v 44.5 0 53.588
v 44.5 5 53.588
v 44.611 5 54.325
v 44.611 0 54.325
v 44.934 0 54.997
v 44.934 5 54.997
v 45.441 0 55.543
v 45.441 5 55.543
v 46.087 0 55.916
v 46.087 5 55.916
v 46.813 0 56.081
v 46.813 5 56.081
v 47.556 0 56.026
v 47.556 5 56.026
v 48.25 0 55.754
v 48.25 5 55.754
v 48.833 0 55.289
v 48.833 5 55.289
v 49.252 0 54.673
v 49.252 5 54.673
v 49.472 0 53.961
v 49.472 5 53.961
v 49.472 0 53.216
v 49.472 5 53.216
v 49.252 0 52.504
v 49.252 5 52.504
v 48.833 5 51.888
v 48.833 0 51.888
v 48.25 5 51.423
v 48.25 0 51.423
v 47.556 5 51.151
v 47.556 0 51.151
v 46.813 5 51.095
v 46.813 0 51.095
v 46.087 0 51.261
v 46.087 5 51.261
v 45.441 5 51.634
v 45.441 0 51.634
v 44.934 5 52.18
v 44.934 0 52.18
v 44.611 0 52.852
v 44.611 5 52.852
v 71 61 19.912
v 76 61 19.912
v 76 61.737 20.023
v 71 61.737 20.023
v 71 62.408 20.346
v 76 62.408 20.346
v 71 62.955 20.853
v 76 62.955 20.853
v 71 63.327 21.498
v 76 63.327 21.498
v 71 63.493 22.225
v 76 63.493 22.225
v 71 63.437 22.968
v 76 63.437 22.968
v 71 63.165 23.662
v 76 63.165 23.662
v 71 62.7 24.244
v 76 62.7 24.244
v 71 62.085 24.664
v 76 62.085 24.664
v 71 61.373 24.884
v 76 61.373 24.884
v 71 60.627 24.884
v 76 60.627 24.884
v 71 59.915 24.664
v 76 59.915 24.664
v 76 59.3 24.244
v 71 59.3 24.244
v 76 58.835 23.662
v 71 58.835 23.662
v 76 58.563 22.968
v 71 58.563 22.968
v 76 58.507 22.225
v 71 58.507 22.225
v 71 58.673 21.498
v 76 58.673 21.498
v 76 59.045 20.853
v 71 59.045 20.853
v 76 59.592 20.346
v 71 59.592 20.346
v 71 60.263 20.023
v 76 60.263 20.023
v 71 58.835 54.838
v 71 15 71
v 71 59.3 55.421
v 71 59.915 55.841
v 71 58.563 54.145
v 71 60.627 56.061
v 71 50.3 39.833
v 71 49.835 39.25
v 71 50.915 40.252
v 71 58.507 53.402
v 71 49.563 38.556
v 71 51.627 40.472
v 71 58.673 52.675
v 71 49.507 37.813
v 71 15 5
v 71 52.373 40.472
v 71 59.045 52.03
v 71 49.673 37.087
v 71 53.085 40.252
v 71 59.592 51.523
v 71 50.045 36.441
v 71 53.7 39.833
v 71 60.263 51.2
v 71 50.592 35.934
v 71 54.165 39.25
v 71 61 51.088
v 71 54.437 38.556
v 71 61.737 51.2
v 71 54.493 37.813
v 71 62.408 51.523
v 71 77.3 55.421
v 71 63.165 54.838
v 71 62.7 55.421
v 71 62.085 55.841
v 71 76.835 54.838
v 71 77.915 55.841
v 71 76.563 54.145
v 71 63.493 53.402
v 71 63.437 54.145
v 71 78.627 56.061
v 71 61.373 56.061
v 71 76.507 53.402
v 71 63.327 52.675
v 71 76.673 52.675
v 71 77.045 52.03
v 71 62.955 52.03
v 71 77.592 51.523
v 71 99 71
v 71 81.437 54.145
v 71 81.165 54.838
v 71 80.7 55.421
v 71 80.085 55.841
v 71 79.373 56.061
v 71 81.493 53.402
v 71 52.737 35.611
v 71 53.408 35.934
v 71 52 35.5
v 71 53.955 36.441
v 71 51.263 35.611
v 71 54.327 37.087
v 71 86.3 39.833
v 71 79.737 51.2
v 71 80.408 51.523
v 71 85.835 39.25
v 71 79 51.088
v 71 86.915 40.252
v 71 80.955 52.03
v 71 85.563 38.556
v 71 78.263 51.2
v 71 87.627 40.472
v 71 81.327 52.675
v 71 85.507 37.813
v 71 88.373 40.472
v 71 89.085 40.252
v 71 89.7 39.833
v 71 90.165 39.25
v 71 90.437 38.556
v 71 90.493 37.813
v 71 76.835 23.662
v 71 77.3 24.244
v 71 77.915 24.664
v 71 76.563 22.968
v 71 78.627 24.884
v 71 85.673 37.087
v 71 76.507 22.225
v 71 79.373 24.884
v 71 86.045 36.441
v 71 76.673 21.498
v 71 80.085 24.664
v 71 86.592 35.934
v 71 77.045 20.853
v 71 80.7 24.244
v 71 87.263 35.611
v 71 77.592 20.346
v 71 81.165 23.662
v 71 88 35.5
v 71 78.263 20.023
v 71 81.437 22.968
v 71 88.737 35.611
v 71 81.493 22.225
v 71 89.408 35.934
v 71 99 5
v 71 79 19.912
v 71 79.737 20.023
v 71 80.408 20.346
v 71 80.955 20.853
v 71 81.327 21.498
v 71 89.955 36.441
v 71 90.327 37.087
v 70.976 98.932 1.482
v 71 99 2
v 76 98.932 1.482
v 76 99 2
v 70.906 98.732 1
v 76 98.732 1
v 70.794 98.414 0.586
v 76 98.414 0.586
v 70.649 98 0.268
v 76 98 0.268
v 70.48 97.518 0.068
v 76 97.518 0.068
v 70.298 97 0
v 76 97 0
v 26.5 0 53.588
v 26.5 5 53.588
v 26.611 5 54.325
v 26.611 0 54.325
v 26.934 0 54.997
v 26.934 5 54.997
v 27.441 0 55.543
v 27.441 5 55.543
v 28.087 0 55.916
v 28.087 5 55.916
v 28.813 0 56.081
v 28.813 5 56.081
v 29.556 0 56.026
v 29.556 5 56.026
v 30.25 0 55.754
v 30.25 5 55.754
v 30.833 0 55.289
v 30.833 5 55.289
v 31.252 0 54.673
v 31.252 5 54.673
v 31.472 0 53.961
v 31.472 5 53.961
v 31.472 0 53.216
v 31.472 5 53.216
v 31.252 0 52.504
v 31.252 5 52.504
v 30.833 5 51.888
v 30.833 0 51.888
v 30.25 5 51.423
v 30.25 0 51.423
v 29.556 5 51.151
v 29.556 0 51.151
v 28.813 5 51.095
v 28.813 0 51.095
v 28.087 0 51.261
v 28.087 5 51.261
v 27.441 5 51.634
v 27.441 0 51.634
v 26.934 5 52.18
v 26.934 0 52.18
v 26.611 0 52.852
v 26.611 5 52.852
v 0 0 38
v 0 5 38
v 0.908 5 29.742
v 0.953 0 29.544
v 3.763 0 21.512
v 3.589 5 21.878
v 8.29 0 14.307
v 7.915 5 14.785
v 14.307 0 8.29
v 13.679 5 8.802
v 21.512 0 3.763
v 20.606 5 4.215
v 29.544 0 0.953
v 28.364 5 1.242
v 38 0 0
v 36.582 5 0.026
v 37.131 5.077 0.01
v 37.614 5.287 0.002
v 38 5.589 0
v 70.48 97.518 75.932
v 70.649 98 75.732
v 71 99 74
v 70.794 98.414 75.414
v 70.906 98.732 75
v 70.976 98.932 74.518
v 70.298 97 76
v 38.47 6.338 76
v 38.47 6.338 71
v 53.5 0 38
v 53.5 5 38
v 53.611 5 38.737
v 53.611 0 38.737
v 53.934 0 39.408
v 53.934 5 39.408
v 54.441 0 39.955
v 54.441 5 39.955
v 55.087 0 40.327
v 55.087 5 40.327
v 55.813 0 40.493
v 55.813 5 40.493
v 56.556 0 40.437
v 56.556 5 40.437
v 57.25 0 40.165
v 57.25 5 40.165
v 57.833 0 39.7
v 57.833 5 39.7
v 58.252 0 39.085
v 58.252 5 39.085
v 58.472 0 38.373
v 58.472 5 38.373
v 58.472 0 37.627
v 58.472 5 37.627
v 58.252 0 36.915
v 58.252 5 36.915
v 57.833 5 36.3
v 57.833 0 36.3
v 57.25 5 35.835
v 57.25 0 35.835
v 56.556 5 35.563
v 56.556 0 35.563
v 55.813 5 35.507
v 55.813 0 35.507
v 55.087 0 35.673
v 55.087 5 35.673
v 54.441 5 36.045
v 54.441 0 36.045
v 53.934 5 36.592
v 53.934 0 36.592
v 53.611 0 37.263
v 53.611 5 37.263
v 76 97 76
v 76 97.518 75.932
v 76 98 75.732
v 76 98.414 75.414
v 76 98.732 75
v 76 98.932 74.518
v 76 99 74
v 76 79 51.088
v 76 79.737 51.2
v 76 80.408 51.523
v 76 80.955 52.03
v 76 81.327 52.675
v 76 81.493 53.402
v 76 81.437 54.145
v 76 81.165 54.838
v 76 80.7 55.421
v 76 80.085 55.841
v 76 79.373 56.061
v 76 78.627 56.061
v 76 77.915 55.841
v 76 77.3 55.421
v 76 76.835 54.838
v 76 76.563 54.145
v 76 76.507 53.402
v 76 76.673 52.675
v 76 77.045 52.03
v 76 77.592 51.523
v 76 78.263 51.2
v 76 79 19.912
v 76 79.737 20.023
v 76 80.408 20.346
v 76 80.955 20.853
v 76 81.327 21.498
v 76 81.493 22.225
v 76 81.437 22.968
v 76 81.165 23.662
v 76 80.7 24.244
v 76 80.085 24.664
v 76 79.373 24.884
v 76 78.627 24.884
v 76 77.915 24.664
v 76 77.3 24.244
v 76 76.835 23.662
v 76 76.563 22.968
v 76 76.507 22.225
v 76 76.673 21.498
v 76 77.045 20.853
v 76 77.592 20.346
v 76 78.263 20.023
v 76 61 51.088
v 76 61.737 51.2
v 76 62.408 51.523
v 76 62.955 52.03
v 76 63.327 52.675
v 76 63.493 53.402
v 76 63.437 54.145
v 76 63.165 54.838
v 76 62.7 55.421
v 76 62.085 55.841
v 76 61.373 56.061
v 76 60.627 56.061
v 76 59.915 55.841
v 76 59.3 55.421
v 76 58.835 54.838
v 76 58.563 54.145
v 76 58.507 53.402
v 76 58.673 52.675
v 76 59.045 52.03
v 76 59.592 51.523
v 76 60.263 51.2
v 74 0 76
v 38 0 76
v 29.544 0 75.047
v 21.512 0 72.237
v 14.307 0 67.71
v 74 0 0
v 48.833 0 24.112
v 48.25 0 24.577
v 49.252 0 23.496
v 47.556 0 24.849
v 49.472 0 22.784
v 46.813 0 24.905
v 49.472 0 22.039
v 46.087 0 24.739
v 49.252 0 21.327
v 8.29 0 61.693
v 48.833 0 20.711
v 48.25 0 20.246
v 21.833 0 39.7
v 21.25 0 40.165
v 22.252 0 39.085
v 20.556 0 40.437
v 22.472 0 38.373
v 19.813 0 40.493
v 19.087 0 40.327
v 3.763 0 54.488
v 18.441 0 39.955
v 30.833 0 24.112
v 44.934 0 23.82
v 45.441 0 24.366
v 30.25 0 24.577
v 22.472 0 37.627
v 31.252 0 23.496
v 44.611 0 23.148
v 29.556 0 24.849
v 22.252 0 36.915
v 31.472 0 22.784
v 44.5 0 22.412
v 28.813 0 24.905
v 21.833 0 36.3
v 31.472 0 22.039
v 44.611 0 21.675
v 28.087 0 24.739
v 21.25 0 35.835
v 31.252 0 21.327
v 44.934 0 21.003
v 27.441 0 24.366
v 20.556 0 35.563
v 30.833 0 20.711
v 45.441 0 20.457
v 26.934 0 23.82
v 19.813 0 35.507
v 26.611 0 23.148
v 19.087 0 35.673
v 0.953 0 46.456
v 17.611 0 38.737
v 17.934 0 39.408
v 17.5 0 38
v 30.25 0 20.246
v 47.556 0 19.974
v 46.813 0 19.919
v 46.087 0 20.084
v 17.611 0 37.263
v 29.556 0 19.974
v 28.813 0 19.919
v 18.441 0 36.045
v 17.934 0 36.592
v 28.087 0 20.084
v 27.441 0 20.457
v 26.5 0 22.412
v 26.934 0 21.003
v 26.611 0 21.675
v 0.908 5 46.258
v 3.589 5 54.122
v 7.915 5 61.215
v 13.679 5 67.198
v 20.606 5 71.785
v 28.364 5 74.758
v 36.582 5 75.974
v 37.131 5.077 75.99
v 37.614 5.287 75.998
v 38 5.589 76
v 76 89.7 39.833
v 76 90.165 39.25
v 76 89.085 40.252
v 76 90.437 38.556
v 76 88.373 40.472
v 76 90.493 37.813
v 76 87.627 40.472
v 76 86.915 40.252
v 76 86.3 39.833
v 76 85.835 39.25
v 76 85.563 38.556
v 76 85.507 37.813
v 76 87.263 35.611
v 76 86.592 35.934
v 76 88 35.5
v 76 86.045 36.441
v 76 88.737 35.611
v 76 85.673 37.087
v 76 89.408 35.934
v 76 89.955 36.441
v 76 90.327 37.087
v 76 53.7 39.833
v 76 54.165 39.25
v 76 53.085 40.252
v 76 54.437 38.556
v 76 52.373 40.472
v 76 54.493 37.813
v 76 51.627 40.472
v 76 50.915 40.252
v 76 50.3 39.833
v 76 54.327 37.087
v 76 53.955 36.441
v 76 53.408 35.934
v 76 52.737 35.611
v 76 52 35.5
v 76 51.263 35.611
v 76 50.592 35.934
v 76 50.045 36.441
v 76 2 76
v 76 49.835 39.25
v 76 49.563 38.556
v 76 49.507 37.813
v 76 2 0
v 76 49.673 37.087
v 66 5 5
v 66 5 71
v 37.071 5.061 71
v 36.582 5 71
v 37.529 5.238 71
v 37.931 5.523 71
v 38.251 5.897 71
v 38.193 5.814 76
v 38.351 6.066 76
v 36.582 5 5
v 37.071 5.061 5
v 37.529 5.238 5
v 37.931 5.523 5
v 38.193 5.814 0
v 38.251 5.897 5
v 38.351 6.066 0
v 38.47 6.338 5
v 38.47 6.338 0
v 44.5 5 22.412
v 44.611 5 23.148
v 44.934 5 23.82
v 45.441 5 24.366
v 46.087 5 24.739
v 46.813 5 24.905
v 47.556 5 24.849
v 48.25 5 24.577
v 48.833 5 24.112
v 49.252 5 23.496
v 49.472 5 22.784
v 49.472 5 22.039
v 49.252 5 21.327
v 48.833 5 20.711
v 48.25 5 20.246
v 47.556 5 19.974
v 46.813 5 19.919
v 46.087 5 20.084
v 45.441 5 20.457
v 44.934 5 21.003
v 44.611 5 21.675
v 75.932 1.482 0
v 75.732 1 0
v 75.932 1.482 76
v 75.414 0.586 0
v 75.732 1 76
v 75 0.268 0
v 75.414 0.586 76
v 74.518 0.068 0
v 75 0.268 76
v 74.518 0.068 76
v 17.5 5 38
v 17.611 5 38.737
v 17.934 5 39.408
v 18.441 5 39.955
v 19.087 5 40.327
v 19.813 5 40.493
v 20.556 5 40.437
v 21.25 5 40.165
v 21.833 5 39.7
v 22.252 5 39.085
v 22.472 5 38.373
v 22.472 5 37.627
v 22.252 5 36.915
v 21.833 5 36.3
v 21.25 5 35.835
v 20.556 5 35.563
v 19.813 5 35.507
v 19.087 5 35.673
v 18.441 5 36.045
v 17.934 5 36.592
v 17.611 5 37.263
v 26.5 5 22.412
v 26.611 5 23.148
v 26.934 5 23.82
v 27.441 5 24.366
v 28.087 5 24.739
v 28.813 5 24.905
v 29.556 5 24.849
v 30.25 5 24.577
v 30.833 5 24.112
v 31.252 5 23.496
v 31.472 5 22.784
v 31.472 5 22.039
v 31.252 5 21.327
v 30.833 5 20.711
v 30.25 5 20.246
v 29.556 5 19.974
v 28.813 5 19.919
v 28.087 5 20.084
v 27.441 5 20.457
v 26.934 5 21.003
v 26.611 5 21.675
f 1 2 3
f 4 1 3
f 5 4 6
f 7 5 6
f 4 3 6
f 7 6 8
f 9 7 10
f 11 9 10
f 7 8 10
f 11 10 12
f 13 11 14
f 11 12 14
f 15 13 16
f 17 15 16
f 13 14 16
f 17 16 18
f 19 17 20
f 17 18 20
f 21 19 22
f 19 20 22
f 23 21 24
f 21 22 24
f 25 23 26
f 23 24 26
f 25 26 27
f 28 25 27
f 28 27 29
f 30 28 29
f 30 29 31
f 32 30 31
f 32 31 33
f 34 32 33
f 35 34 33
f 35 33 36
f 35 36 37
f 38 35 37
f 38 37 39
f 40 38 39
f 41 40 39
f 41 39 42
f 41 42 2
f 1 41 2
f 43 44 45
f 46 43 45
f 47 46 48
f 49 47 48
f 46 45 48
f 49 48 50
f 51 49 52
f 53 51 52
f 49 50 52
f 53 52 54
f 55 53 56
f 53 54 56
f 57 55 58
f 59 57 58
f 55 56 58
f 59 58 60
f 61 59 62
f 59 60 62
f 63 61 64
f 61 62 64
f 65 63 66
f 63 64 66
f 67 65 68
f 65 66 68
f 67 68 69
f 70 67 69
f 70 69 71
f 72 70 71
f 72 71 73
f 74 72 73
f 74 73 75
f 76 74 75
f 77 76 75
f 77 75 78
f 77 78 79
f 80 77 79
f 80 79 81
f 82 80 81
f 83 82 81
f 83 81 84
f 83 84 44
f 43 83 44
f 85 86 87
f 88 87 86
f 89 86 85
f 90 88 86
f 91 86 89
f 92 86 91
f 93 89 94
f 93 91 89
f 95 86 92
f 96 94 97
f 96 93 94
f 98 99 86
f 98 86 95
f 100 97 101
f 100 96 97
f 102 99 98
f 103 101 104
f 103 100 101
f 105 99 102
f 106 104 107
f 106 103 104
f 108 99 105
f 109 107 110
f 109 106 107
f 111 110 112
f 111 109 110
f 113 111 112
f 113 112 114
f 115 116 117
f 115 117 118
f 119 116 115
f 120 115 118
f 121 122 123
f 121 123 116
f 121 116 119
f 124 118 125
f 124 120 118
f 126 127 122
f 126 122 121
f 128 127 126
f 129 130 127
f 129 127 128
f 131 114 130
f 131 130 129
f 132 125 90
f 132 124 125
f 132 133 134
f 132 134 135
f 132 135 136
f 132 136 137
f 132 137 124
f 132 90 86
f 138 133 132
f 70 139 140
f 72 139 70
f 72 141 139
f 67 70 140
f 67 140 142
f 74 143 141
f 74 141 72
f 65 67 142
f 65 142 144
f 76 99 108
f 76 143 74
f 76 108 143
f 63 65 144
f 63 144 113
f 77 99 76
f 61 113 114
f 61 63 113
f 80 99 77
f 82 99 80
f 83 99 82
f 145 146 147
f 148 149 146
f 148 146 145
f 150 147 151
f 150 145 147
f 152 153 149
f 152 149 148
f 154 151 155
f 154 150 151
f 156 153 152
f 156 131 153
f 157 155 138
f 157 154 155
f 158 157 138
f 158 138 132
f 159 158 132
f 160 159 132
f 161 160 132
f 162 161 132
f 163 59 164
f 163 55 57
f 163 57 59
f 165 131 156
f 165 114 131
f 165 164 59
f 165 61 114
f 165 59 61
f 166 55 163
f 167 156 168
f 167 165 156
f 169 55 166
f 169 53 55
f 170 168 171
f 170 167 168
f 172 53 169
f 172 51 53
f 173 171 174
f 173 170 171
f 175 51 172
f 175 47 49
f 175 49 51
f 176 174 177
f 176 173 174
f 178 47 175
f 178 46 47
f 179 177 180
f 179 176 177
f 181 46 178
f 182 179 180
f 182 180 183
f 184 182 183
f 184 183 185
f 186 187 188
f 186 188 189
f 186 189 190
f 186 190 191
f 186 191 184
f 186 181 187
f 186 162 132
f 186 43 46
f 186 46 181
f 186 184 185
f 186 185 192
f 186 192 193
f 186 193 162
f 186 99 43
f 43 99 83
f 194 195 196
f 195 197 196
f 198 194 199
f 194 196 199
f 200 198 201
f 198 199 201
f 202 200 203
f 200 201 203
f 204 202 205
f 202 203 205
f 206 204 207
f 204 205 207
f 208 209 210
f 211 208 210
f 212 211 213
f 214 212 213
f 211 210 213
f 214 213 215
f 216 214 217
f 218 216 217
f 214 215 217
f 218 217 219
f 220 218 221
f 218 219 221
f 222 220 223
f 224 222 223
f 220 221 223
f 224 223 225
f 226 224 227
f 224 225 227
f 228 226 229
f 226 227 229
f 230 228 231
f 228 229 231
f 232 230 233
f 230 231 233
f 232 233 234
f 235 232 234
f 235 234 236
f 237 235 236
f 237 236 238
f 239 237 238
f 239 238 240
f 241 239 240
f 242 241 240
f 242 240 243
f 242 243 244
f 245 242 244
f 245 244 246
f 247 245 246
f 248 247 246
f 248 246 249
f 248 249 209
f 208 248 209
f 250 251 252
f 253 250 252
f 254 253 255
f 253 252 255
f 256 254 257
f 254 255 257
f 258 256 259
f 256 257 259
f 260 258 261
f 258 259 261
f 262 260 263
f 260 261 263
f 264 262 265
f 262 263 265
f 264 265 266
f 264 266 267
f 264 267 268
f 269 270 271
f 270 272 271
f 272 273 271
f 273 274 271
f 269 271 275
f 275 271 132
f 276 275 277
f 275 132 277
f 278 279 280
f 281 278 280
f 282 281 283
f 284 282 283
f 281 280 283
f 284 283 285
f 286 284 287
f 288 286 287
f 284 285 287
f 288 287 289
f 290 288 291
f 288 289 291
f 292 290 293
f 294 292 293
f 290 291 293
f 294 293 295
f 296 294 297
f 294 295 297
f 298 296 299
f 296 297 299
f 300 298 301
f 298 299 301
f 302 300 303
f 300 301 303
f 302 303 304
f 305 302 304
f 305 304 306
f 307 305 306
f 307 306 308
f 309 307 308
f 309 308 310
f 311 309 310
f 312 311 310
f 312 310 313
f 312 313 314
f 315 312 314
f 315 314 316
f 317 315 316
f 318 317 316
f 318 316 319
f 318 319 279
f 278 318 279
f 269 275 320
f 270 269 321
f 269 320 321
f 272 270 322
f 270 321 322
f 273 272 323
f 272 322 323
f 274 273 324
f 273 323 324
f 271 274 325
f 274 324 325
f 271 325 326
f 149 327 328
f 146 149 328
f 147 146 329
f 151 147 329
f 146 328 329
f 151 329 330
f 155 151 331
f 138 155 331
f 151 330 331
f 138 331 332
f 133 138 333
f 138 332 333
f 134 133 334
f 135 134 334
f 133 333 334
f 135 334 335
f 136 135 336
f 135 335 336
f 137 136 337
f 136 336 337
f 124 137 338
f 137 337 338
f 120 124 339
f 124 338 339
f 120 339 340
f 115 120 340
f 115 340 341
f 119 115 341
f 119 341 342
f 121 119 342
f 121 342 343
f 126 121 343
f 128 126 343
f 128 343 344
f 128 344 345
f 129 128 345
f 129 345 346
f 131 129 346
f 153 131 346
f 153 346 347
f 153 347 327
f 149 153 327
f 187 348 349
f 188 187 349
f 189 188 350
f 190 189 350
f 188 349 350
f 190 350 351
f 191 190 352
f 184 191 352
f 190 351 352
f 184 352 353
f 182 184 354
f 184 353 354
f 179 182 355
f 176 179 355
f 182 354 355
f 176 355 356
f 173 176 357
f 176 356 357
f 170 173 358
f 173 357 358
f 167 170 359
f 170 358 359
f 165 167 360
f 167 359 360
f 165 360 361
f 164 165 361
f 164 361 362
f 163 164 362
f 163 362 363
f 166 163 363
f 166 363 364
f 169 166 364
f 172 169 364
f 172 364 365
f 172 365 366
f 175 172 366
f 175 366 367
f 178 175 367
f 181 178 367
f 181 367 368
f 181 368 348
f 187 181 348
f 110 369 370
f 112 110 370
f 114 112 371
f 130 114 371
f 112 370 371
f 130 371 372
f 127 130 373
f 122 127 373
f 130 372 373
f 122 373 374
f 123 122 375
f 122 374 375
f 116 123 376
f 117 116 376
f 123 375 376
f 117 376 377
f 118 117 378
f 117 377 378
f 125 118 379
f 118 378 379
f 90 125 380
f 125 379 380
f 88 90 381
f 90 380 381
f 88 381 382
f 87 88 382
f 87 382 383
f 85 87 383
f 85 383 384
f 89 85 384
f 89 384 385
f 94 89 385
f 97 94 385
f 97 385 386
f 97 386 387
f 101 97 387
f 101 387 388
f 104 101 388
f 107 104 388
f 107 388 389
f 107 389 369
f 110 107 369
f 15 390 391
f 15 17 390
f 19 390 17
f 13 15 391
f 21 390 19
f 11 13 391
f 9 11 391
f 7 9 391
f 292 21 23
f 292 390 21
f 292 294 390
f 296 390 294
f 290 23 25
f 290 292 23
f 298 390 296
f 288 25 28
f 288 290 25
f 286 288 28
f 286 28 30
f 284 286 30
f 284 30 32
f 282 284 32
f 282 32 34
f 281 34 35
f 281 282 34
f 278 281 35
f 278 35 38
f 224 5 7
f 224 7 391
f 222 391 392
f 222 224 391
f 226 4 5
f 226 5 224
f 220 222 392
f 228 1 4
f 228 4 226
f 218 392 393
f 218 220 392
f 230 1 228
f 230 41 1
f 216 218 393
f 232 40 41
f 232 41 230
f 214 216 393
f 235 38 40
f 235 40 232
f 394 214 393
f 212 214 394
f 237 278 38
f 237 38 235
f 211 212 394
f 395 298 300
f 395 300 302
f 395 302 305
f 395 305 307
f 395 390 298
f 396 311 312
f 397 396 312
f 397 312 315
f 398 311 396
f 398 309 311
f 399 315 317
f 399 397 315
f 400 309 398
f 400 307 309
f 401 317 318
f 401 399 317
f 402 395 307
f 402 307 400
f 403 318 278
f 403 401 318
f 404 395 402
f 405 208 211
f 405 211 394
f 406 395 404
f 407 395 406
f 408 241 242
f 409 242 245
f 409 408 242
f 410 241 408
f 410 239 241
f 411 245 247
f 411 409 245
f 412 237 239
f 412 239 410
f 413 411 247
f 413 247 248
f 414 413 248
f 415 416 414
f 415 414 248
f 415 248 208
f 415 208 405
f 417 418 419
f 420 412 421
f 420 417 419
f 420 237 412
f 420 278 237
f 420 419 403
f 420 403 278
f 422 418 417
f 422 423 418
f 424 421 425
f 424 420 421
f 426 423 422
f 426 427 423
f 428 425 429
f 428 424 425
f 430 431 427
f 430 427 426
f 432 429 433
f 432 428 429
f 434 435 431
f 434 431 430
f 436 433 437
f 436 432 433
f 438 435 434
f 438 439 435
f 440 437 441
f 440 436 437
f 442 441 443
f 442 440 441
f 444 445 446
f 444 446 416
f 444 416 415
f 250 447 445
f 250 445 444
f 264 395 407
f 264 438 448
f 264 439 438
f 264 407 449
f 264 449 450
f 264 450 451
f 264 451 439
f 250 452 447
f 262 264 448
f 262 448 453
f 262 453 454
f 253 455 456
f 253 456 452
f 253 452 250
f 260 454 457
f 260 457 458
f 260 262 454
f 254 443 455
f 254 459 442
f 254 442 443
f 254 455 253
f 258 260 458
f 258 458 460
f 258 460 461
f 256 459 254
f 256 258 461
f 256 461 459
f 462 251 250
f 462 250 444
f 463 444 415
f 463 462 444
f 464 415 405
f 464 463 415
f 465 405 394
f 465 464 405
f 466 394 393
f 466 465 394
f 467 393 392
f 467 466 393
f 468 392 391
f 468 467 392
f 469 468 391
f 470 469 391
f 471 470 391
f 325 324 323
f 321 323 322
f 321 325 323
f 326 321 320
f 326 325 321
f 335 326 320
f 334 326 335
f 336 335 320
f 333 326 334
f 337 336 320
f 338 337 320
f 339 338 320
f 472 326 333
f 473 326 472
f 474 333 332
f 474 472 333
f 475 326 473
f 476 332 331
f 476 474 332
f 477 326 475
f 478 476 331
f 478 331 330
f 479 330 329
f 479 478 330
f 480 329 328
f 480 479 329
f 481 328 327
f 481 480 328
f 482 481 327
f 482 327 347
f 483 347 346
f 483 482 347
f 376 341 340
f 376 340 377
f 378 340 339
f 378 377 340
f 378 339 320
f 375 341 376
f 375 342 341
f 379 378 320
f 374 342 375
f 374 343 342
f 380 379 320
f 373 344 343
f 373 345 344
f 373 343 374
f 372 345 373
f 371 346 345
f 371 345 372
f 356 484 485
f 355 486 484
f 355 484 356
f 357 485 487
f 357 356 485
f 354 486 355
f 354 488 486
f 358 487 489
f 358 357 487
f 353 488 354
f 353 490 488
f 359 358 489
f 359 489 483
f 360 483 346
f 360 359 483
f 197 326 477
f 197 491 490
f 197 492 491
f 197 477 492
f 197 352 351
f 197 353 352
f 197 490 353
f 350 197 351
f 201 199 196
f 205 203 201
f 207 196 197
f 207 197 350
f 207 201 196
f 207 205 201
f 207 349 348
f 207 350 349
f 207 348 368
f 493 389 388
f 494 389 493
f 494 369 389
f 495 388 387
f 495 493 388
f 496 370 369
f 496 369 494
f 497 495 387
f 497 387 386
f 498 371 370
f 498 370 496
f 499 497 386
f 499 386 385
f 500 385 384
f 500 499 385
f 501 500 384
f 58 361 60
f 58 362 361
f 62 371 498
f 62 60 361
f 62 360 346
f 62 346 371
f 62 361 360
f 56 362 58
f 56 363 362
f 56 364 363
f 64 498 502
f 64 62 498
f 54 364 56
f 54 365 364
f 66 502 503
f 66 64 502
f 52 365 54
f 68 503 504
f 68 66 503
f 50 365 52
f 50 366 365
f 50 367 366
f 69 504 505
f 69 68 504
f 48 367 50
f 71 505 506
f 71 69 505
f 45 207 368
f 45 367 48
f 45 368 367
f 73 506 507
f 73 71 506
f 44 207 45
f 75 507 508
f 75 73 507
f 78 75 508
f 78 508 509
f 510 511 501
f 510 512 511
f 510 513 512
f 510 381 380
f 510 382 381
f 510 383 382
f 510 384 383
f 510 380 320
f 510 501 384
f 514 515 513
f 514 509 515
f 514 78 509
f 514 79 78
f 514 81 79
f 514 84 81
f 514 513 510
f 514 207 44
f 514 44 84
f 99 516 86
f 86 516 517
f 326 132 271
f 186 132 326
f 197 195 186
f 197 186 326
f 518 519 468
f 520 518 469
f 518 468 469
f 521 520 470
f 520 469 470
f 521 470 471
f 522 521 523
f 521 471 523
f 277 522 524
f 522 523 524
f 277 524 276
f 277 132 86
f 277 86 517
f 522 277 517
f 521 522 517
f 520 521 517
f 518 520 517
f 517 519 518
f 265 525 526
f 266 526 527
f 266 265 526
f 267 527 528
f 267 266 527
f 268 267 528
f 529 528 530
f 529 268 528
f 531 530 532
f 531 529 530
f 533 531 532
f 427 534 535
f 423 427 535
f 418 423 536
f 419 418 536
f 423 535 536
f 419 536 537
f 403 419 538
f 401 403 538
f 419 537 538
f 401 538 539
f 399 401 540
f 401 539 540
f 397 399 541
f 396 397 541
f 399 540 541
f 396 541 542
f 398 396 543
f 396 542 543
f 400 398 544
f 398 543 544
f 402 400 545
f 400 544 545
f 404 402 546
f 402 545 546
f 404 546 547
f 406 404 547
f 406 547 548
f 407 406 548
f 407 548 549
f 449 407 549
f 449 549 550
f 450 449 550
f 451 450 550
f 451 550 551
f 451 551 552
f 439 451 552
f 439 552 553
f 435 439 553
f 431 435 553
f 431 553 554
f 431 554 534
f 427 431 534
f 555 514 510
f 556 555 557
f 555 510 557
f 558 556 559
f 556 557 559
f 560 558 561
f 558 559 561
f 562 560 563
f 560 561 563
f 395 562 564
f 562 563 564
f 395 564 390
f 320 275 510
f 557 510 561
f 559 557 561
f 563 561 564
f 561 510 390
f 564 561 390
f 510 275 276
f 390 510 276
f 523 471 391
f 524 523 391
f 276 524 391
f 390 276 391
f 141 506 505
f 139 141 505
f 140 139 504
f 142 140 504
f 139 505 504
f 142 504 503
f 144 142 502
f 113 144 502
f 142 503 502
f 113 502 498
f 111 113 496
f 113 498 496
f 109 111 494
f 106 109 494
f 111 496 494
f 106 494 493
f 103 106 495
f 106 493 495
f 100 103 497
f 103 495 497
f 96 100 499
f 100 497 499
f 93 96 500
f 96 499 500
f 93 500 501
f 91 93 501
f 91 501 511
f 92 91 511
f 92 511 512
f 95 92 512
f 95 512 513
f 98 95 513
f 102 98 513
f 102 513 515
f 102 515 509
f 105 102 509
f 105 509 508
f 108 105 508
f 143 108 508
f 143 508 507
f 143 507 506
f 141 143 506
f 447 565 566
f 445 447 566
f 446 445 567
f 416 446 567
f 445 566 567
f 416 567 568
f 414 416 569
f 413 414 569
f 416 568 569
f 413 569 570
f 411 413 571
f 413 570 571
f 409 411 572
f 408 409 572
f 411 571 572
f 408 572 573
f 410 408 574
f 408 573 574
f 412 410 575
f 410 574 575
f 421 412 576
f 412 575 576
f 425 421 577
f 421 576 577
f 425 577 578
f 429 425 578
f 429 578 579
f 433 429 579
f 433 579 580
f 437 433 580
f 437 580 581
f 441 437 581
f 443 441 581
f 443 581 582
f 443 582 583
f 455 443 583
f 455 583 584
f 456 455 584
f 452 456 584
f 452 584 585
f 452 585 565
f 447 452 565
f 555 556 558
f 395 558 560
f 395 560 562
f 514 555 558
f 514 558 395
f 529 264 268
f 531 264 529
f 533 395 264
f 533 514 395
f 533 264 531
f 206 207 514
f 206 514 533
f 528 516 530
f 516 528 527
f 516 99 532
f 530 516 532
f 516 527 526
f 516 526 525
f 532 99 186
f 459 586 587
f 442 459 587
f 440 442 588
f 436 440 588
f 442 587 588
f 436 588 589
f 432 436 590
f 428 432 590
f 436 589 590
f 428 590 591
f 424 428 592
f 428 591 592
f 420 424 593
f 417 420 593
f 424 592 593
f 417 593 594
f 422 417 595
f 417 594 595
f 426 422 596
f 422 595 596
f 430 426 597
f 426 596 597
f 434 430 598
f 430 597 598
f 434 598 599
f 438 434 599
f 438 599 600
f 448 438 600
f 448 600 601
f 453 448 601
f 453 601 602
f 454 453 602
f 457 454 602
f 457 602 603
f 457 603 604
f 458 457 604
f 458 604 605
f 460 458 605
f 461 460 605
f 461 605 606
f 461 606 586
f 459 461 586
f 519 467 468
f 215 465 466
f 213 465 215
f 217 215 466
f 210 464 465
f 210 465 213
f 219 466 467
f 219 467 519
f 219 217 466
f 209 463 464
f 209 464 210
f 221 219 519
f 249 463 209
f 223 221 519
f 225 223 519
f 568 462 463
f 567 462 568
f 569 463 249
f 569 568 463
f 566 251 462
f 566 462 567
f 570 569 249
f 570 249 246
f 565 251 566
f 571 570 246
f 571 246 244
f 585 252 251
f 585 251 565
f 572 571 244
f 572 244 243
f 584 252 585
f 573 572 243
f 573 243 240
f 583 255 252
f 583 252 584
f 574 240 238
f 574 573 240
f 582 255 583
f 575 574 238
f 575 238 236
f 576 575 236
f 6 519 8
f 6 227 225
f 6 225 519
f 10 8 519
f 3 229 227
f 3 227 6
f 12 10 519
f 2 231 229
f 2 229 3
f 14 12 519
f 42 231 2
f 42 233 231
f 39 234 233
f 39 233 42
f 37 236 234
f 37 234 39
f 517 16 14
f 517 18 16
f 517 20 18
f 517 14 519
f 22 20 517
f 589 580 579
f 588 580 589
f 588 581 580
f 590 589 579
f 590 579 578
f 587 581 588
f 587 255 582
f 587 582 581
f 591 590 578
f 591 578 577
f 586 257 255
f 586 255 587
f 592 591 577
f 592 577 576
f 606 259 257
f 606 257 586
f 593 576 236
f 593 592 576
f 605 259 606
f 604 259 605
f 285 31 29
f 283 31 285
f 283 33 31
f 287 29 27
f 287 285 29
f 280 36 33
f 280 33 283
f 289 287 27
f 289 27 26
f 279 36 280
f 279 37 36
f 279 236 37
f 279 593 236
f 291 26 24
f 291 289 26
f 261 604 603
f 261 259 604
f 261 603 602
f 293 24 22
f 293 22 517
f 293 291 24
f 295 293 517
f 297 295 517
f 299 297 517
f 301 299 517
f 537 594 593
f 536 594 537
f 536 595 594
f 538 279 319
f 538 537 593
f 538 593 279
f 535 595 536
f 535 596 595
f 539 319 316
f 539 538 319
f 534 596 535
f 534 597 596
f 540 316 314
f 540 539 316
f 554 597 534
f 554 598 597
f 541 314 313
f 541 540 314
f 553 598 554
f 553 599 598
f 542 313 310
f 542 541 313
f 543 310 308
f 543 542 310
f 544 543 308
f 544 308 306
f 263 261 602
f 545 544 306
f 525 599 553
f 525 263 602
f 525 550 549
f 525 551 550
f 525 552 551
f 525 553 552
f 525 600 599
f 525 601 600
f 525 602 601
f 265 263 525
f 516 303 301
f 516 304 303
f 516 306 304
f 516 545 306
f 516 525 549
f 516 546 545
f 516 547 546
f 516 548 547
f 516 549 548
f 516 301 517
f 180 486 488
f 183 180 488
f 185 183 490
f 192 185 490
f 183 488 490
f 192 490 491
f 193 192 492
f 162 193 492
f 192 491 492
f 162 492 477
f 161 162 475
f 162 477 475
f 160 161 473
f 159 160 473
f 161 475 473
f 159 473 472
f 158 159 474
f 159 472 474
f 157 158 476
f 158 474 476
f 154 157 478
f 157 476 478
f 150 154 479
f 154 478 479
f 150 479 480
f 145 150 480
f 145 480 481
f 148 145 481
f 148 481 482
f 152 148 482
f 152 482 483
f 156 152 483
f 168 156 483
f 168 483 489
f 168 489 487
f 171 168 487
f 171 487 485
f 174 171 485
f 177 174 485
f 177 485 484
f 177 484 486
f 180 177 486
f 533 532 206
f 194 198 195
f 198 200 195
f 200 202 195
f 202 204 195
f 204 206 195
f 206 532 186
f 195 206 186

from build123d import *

# Parameters (mm, degrees)
EXTRUDE_1_DEPTH     = 76
FILLET_1_R          = 38
RIB_1_REACH         = 148.127
SKETCH_4_WALL_W     = 393.877609006
SKETCH_4_WALL_H     = 5
RIB_START           = -5
RIB_2_DEPTH         = 5
SKETCH_7_R          = 2.5
CUT_EXTRUDE_1_DEPTH = 10
SKETCH_8_R          = 2.5
CUT_EXTRUDE_2_DEPTH = 10
FILLET_2_R          = 2
CHAMFER_1_SIZE      = 10
CHAMFER_1_SIZE2     = 5
FILLET_3_R          = 2
FILLET_4_R          = 2


# Read off the part's stored shape, not the designer's step: Ребро2
with BuildPart() as part:
    # Эскиз3 → Бобышка-Вытянуть1 (new body)
    with BuildSketch(Plane.XY):
        Polygon((76, 0), (0, 0), (0, 5), (71, 5), (71, 99), (76, 99), align=None)
    extrude(amount=EXTRUDE_1_DEPTH)

    # Скругление1
    fillet_1_edges = [part.edges().sort_by_distance(p)[0] for p in [
        (0, 2.5, 0),
        (0, 2.5, 76),
    ]]
    fillet(fillet_1_edges, radius=FILLET_1_R - 0.0001)  # a hair under: the kernel refuses the full size

    # Эскиз4 wall → Ребро1 (add, up to next)
    with BuildSketch(Plane(origin=(54.5, 52, 76), x_dir=(-0.331244504731, -0.94354495287, 0), z_dir=(0.94354495287, -0.331244504731, 0)), mode=Mode.PRIVATE) as rib_1_sk1:
        with Locations((0, 2.5)):
            Rectangle(SKETCH_4_WALL_W, SKETCH_4_WALL_H)
    rib_1_tool1 = extrude(rib_1_sk1.sketch, amount=RIB_1_REACH, mode=Mode.PRIVATE) - part.part
    add(rib_1_tool1.solids().sort_by_distance((54.5, 52, 76))[0])

    # Ребро2 outline → Ребро2 (add)
    with BuildSketch(Plane(origin=(0, 0, 0), x_dir=(-1, 0, 0), z_dir=(0, 0, -1)).offset(RIB_START)):
        Polygon((-38, 5), (-71, 99), (-71, 5), align=None)
    extrude(amount=RIB_2_DEPTH)

    # Эскиз7 → Вырез-Вытянуть1 (cut)
    with BuildSketch(Plane(origin=(0, 5, 0), x_dir=(1, 0, 0), z_dir=(0, 1, 0))):
        with Locations(Location((20, -38, 0), (0, 0, 180))):
            Circle(SKETCH_7_R)
        with Locations(Location((29, -22.411542732, 0), (0, 0, 180))):
            Circle(SKETCH_7_R)
        with Locations(Location((47, -22.411542732, 0), (0, 0, 180))):
            Circle(SKETCH_7_R)
        with Locations(Location((56, -38, 0), (0, 0, 180))):
            Circle(SKETCH_7_R)
        with Locations(Location((47, -53.588457268, 0), (0, 0, 180))):
            Circle(SKETCH_7_R)
        with Locations(Location((29, -53.588457268, 0), (0, 0, 180))):
            Circle(SKETCH_7_R)
    extrude(amount=-CUT_EXTRUDE_1_DEPTH, mode=Mode.SUBTRACT)

    # Эскиз8 → Вырез-Вытянуть2 (cut)
    with BuildSketch(Plane(origin=(76, 0, 0), x_dir=(0, 0, -1), z_dir=(1, 0, 0))):
        with Locations((-38, 52)):
            Circle(SKETCH_8_R)
        with Locations((-53.588457268, 61)):
            Circle(SKETCH_8_R)
        with Locations((-53.588457268, 79)):
            Circle(SKETCH_8_R)
        with Locations((-38, 88)):
            Circle(SKETCH_8_R)
        with Locations((-22.411542732, 79)):
            Circle(SKETCH_8_R)
        with Locations((-22.411542732, 61)):
            Circle(SKETCH_8_R)
    extrude(amount=-CUT_EXTRUDE_2_DEPTH, mode=Mode.SUBTRACT)

    # Скругление2
    fillet_2_edges = [part.edges().sort_by_distance(p)[0] for p in [
        (76, 0, 38),
    ]]
    fillet(fillet_2_edges, radius=FILLET_2_R)

    # Фаска1
    chamfer_1_edges = [part.edges().sort_by_distance(p)[0] for p in [
        (71, 5, 38),
    ]]
    chamfer_1_side = [part.faces().sort_by_distance(p)[0] for p in [
        (71, 52, 6.148564321),
    ]]
    chamfer(chamfer_1_edges, length=CHAMFER_1_SIZE, length2=CHAMFER_1_SIZE2, reference=chamfer_1_side[0])

    # Скругление3
    fillet_3_edges = [part.edges().sort_by_distance(p)[0] for p in [
        (38, 5, 73.5),
        (38, 5, 2.5),
    ]]
    fillet(fillet_3_edges, radius=FILLET_3_R)

    # Скругление4
    fillet_4_edges = [part.edges().sort_by_distance(p)[0] for p in [
        (73.5, 99, 76),
        (73.5, 99, 0),
    ]]
    fillet(fillet_4_edges, radius=FILLET_4_R)


solid = part.part
